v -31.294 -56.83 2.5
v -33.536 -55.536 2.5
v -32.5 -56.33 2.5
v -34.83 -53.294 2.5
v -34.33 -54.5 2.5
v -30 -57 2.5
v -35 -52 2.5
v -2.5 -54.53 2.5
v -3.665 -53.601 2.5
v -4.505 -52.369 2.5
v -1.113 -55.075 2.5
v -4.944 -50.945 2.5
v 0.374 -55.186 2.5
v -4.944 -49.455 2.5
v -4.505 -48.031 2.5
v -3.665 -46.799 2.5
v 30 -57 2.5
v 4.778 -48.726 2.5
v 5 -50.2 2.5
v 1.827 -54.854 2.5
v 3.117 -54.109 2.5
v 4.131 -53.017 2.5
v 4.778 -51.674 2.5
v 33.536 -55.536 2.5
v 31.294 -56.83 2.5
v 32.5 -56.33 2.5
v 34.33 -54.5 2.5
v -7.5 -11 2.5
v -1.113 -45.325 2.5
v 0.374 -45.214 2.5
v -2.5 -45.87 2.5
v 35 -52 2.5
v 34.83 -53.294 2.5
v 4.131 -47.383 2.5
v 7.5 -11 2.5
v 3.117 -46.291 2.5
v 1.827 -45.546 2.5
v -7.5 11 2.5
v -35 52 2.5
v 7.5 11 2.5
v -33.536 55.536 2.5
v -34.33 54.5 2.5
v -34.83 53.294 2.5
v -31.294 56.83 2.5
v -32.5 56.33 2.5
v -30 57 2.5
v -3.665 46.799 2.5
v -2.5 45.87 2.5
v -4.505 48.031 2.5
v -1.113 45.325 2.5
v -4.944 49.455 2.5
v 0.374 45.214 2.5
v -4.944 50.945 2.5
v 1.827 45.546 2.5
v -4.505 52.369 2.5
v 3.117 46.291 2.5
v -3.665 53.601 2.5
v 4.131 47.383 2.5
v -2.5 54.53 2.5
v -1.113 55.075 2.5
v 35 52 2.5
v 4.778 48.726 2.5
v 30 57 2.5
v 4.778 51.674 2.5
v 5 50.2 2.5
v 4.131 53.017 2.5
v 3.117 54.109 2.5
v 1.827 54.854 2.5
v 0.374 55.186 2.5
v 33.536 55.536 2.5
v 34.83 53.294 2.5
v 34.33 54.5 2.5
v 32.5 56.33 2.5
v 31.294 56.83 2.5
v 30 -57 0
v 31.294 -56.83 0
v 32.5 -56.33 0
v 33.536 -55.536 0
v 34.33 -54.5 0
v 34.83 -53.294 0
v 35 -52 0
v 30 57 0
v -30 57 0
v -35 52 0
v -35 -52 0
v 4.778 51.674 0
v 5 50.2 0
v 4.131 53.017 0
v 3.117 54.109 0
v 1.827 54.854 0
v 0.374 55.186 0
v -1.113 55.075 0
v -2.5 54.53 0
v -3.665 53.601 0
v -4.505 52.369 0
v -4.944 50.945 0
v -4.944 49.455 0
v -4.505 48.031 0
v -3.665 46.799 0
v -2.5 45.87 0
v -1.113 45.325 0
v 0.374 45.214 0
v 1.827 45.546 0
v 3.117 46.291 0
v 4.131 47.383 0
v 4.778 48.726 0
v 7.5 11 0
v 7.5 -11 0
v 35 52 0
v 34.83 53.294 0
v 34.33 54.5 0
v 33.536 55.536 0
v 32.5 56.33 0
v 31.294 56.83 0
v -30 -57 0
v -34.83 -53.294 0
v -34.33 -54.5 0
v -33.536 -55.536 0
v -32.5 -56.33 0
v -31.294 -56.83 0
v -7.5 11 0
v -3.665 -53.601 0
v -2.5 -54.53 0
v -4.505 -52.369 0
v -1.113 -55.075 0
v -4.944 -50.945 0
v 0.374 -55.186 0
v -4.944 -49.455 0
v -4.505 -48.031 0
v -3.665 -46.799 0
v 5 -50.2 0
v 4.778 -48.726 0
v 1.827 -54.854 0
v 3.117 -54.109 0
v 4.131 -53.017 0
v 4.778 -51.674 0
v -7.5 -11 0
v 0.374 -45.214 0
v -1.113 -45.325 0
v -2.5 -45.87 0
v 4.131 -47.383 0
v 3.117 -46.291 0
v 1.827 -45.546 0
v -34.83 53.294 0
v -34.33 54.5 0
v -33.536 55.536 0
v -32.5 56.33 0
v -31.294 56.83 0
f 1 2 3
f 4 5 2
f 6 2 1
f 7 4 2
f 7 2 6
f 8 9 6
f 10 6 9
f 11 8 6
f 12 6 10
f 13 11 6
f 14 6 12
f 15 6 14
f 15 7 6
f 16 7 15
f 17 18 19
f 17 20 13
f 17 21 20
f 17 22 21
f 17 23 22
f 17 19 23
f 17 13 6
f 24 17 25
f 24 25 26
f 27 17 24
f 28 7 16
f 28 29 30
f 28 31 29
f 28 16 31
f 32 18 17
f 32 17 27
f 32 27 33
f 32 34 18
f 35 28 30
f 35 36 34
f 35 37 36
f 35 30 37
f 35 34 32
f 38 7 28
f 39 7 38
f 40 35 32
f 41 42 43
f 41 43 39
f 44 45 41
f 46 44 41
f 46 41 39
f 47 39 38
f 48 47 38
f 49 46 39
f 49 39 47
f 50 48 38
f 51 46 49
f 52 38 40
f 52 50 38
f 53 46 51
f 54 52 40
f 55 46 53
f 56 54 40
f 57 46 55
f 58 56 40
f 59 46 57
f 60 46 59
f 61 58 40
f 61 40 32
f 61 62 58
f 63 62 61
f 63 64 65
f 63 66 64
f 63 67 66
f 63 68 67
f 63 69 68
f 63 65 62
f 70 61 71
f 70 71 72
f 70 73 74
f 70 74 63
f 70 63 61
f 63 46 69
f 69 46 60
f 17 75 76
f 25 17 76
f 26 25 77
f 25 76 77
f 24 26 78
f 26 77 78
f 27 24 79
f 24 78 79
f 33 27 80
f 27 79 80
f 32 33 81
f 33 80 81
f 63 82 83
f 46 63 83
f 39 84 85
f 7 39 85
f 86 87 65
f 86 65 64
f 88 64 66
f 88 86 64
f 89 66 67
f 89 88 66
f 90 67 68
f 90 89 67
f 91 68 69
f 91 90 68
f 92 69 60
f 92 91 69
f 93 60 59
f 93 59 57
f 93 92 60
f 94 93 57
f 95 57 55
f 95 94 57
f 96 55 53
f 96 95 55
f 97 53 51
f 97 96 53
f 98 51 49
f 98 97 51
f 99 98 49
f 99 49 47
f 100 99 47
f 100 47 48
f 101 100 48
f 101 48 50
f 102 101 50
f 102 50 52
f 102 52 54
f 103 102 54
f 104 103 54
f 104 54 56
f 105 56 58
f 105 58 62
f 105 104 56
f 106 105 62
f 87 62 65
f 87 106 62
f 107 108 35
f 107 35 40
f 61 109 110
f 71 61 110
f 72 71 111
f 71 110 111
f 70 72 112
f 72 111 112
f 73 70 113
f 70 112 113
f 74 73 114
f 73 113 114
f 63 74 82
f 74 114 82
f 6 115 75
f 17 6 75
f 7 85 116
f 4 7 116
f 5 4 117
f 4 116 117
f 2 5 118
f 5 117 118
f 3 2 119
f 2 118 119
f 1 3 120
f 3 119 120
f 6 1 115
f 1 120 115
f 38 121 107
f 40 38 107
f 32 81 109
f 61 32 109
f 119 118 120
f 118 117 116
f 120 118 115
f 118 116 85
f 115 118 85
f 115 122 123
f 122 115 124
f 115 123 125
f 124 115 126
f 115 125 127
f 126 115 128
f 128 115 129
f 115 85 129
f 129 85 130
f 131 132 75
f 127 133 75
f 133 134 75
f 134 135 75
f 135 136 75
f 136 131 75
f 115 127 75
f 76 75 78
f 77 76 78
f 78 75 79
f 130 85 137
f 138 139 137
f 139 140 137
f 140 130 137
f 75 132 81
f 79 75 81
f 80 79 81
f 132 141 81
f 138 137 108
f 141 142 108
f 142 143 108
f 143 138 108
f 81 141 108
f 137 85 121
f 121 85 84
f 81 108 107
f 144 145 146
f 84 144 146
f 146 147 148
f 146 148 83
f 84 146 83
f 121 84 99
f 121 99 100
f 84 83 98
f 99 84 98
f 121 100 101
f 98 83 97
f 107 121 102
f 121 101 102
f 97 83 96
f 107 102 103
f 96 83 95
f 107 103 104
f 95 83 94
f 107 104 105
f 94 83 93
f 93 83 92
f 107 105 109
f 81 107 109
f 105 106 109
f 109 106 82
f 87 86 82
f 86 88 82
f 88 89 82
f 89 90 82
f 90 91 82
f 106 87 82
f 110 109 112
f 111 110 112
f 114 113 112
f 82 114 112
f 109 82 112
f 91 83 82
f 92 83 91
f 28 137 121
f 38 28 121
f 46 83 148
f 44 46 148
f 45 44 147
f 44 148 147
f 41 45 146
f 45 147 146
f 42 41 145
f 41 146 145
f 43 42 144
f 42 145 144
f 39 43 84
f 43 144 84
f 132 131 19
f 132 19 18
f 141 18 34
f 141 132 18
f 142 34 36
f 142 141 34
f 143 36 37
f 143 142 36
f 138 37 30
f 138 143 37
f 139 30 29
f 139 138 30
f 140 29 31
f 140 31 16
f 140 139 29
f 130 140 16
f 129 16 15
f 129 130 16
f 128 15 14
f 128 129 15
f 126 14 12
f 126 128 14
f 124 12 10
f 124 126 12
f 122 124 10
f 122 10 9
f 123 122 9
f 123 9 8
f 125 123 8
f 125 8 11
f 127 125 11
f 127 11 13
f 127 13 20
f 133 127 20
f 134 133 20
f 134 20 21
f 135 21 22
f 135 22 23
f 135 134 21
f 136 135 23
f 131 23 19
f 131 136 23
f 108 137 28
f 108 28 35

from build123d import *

# Parameters (mm, degrees)
F0_R     = 5
F0_W     = 15
F0_H     = 22
F1_DEPTH = 2.5


with BuildPart() as f1:
    # F0 (on Top) → F1 (new body)
    with BuildSketch(Plane.XY):
        with BuildLine():
            Line((30, 57), (-30, 57))
            ThreePointArc((-30, 57), (-33.535534, 55.535534), (-35, 52))
            Line((-35, 52), (-35, -52))
            ThreePointArc((-35, -52), (-33.535534, -55.535534), (-30, -57))
            Line((-30, -57), (30, -57))
            ThreePointArc((30, -57), (33.535534, -55.535534), (35, -52))
            Line((35, -52), (35, 52))
            ThreePointArc((35, 52), (33.535534, 55.535534), (30, 57))
        make_face()
        with Locations((0, -50.2)):
            Circle(F0_R, mode=Mode.SUBTRACT)
        Rectangle(F0_W, F0_H, mode=Mode.SUBTRACT)
        with Locations((0, 50.2)):
            Circle(F0_R, mode=Mode.SUBTRACT)
    extrude(amount=F1_DEPTH)


solid = f1.part
